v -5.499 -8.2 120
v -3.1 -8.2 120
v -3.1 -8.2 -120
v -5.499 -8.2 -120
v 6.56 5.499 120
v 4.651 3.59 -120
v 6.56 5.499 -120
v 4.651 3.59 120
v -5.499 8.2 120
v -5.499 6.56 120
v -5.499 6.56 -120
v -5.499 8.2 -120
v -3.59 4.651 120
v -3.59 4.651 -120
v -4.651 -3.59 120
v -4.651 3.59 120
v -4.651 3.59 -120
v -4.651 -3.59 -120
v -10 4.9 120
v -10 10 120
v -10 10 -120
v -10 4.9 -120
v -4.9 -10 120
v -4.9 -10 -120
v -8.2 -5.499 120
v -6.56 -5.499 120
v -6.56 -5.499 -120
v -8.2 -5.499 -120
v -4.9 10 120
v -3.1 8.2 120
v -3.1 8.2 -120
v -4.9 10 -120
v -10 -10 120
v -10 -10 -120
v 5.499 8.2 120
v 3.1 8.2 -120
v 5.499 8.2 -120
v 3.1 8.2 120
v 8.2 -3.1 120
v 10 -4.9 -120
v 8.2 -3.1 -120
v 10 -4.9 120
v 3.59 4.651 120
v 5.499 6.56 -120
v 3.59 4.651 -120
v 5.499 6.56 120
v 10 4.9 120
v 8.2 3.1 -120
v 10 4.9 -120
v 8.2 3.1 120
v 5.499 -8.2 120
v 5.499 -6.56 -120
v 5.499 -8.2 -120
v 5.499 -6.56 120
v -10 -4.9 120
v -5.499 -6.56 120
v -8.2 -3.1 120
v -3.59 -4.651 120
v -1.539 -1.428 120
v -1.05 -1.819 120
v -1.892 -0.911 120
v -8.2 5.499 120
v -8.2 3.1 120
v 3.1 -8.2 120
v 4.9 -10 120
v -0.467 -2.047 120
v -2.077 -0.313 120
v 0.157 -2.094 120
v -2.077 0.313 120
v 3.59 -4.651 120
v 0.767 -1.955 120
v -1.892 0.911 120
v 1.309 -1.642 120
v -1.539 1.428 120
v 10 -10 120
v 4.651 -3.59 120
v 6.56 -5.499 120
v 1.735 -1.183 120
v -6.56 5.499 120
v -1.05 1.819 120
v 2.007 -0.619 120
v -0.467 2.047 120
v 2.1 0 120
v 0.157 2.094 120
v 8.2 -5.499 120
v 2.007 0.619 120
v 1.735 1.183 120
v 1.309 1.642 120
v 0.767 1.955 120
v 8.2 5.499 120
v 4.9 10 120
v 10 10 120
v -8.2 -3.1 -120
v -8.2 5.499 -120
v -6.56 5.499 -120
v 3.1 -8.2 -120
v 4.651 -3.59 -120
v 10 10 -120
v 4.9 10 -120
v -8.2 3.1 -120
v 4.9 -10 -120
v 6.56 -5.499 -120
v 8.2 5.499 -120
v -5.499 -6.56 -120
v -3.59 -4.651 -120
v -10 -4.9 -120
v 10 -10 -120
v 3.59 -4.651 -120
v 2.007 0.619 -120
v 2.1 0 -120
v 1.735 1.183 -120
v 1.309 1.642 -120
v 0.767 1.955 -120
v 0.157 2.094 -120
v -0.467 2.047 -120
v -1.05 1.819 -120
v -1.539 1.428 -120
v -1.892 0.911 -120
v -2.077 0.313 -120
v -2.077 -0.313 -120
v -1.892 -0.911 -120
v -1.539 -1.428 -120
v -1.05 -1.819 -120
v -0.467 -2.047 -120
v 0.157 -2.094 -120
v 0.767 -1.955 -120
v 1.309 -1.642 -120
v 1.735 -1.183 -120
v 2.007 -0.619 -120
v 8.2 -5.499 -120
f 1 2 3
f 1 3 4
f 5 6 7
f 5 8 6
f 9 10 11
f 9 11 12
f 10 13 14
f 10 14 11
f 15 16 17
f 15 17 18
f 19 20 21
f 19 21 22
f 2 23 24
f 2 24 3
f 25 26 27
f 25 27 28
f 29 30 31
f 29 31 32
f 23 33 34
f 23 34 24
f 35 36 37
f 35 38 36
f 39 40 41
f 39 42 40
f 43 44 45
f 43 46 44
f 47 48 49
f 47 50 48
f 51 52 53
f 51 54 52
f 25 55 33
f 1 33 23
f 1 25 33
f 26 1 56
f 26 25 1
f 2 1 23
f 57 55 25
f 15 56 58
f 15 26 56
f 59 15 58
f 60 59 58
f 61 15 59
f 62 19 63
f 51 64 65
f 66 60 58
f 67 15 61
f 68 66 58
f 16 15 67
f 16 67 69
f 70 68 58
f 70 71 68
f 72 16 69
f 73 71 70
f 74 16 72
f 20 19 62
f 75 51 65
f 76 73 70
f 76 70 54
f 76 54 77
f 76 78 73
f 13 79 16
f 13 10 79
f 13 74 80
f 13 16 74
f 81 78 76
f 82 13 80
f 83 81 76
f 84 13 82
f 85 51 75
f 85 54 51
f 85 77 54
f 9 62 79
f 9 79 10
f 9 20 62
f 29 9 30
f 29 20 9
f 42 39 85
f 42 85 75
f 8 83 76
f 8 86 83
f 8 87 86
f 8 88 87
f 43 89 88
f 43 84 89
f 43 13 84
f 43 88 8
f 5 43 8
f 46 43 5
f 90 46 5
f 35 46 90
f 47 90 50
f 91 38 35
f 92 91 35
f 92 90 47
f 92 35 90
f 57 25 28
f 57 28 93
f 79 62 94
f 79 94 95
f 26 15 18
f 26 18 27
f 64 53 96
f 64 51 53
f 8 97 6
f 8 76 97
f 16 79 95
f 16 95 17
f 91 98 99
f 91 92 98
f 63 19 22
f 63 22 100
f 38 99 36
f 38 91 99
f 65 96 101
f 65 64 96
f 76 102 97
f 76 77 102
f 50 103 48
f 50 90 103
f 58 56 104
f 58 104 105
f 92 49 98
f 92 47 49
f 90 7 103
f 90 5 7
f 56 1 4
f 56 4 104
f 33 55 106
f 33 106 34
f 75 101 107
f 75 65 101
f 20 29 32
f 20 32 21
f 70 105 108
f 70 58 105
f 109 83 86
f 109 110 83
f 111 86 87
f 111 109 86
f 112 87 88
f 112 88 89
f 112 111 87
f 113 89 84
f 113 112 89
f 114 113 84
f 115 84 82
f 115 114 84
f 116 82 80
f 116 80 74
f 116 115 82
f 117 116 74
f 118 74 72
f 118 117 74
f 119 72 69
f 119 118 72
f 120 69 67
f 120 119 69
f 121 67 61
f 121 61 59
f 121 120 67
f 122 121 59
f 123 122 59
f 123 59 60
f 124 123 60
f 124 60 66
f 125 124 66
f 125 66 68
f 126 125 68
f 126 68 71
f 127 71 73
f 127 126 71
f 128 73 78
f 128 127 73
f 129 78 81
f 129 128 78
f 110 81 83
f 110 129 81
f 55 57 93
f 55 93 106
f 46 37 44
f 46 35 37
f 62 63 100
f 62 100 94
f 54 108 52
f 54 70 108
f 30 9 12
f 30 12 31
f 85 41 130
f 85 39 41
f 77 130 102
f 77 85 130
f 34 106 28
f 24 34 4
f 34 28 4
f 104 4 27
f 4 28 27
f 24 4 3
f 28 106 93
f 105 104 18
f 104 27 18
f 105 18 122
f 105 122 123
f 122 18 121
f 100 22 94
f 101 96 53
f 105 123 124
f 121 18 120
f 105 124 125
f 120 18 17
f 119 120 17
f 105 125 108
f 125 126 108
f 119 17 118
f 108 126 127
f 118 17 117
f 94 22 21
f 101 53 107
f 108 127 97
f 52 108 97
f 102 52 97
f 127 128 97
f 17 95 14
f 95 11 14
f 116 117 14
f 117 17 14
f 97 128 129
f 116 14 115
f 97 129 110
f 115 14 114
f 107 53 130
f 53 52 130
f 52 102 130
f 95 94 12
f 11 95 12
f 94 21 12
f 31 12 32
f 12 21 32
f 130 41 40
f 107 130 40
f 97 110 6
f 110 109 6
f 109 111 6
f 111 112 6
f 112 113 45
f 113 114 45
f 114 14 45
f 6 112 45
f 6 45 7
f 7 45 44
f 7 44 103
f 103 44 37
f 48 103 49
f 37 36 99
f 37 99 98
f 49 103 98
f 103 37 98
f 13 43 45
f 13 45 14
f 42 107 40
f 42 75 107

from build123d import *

# Parameters (mm, degrees)
SKETCH1_R           = 2.1
BOSS_EXTRUDE1_DEPTH = 120


with BuildPart() as part:
    # Sketch1 → Boss-Extrude1 (new body, symmetric)
    with BuildSketch(Plane.XY):
        Polygon((5.499339828, 6.56), (3.59, 4.650660172), (-3.59, 4.650660172), (-5.499339828, 6.56), (-5.499339828, 8.2), (-3.1, 8.2), (-4.9, 10), (-10, 10), (-10, 4.9), (-8.2, 3.1), (-8.2, 5.499339828), (-6.56, 5.499339828), (-4.650660172, 3.59), (-4.650660172, -3.59), (-6.56, -5.499339828), (-8.2, -5.499339828), (-8.2, -3.1), (-10, -4.9), (-10, -10), (-4.9, -10), (-3.1, -8.2), (-5.499339828, -8.2), (-5.499339828, -6.56), (-3.59, -4.650660172), (3.59, -4.650660172), (5.499339828, -6.56), (5.499339828, -8.2), (3.1, -8.2), (4.9, -10), (10, -10), (10, -4.9), (8.2, -3.1), (8.2, -5.499339828), (6.56, -5.499339828), (4.650660172, -3.59), (4.650660172, 3.59), (6.56, 5.499339828), (8.2, 5.499339828), (8.2, 3.1), (10, 4.9), (10, 10), (4.9, 10), (3.1, 8.2), (5.499339828, 8.2), align=None)
        Circle(SKETCH1_R, mode=Mode.SUBTRACT)
    extrude(amount=BOSS_EXTRUDE1_DEPTH, both=True)


solid = part.part
